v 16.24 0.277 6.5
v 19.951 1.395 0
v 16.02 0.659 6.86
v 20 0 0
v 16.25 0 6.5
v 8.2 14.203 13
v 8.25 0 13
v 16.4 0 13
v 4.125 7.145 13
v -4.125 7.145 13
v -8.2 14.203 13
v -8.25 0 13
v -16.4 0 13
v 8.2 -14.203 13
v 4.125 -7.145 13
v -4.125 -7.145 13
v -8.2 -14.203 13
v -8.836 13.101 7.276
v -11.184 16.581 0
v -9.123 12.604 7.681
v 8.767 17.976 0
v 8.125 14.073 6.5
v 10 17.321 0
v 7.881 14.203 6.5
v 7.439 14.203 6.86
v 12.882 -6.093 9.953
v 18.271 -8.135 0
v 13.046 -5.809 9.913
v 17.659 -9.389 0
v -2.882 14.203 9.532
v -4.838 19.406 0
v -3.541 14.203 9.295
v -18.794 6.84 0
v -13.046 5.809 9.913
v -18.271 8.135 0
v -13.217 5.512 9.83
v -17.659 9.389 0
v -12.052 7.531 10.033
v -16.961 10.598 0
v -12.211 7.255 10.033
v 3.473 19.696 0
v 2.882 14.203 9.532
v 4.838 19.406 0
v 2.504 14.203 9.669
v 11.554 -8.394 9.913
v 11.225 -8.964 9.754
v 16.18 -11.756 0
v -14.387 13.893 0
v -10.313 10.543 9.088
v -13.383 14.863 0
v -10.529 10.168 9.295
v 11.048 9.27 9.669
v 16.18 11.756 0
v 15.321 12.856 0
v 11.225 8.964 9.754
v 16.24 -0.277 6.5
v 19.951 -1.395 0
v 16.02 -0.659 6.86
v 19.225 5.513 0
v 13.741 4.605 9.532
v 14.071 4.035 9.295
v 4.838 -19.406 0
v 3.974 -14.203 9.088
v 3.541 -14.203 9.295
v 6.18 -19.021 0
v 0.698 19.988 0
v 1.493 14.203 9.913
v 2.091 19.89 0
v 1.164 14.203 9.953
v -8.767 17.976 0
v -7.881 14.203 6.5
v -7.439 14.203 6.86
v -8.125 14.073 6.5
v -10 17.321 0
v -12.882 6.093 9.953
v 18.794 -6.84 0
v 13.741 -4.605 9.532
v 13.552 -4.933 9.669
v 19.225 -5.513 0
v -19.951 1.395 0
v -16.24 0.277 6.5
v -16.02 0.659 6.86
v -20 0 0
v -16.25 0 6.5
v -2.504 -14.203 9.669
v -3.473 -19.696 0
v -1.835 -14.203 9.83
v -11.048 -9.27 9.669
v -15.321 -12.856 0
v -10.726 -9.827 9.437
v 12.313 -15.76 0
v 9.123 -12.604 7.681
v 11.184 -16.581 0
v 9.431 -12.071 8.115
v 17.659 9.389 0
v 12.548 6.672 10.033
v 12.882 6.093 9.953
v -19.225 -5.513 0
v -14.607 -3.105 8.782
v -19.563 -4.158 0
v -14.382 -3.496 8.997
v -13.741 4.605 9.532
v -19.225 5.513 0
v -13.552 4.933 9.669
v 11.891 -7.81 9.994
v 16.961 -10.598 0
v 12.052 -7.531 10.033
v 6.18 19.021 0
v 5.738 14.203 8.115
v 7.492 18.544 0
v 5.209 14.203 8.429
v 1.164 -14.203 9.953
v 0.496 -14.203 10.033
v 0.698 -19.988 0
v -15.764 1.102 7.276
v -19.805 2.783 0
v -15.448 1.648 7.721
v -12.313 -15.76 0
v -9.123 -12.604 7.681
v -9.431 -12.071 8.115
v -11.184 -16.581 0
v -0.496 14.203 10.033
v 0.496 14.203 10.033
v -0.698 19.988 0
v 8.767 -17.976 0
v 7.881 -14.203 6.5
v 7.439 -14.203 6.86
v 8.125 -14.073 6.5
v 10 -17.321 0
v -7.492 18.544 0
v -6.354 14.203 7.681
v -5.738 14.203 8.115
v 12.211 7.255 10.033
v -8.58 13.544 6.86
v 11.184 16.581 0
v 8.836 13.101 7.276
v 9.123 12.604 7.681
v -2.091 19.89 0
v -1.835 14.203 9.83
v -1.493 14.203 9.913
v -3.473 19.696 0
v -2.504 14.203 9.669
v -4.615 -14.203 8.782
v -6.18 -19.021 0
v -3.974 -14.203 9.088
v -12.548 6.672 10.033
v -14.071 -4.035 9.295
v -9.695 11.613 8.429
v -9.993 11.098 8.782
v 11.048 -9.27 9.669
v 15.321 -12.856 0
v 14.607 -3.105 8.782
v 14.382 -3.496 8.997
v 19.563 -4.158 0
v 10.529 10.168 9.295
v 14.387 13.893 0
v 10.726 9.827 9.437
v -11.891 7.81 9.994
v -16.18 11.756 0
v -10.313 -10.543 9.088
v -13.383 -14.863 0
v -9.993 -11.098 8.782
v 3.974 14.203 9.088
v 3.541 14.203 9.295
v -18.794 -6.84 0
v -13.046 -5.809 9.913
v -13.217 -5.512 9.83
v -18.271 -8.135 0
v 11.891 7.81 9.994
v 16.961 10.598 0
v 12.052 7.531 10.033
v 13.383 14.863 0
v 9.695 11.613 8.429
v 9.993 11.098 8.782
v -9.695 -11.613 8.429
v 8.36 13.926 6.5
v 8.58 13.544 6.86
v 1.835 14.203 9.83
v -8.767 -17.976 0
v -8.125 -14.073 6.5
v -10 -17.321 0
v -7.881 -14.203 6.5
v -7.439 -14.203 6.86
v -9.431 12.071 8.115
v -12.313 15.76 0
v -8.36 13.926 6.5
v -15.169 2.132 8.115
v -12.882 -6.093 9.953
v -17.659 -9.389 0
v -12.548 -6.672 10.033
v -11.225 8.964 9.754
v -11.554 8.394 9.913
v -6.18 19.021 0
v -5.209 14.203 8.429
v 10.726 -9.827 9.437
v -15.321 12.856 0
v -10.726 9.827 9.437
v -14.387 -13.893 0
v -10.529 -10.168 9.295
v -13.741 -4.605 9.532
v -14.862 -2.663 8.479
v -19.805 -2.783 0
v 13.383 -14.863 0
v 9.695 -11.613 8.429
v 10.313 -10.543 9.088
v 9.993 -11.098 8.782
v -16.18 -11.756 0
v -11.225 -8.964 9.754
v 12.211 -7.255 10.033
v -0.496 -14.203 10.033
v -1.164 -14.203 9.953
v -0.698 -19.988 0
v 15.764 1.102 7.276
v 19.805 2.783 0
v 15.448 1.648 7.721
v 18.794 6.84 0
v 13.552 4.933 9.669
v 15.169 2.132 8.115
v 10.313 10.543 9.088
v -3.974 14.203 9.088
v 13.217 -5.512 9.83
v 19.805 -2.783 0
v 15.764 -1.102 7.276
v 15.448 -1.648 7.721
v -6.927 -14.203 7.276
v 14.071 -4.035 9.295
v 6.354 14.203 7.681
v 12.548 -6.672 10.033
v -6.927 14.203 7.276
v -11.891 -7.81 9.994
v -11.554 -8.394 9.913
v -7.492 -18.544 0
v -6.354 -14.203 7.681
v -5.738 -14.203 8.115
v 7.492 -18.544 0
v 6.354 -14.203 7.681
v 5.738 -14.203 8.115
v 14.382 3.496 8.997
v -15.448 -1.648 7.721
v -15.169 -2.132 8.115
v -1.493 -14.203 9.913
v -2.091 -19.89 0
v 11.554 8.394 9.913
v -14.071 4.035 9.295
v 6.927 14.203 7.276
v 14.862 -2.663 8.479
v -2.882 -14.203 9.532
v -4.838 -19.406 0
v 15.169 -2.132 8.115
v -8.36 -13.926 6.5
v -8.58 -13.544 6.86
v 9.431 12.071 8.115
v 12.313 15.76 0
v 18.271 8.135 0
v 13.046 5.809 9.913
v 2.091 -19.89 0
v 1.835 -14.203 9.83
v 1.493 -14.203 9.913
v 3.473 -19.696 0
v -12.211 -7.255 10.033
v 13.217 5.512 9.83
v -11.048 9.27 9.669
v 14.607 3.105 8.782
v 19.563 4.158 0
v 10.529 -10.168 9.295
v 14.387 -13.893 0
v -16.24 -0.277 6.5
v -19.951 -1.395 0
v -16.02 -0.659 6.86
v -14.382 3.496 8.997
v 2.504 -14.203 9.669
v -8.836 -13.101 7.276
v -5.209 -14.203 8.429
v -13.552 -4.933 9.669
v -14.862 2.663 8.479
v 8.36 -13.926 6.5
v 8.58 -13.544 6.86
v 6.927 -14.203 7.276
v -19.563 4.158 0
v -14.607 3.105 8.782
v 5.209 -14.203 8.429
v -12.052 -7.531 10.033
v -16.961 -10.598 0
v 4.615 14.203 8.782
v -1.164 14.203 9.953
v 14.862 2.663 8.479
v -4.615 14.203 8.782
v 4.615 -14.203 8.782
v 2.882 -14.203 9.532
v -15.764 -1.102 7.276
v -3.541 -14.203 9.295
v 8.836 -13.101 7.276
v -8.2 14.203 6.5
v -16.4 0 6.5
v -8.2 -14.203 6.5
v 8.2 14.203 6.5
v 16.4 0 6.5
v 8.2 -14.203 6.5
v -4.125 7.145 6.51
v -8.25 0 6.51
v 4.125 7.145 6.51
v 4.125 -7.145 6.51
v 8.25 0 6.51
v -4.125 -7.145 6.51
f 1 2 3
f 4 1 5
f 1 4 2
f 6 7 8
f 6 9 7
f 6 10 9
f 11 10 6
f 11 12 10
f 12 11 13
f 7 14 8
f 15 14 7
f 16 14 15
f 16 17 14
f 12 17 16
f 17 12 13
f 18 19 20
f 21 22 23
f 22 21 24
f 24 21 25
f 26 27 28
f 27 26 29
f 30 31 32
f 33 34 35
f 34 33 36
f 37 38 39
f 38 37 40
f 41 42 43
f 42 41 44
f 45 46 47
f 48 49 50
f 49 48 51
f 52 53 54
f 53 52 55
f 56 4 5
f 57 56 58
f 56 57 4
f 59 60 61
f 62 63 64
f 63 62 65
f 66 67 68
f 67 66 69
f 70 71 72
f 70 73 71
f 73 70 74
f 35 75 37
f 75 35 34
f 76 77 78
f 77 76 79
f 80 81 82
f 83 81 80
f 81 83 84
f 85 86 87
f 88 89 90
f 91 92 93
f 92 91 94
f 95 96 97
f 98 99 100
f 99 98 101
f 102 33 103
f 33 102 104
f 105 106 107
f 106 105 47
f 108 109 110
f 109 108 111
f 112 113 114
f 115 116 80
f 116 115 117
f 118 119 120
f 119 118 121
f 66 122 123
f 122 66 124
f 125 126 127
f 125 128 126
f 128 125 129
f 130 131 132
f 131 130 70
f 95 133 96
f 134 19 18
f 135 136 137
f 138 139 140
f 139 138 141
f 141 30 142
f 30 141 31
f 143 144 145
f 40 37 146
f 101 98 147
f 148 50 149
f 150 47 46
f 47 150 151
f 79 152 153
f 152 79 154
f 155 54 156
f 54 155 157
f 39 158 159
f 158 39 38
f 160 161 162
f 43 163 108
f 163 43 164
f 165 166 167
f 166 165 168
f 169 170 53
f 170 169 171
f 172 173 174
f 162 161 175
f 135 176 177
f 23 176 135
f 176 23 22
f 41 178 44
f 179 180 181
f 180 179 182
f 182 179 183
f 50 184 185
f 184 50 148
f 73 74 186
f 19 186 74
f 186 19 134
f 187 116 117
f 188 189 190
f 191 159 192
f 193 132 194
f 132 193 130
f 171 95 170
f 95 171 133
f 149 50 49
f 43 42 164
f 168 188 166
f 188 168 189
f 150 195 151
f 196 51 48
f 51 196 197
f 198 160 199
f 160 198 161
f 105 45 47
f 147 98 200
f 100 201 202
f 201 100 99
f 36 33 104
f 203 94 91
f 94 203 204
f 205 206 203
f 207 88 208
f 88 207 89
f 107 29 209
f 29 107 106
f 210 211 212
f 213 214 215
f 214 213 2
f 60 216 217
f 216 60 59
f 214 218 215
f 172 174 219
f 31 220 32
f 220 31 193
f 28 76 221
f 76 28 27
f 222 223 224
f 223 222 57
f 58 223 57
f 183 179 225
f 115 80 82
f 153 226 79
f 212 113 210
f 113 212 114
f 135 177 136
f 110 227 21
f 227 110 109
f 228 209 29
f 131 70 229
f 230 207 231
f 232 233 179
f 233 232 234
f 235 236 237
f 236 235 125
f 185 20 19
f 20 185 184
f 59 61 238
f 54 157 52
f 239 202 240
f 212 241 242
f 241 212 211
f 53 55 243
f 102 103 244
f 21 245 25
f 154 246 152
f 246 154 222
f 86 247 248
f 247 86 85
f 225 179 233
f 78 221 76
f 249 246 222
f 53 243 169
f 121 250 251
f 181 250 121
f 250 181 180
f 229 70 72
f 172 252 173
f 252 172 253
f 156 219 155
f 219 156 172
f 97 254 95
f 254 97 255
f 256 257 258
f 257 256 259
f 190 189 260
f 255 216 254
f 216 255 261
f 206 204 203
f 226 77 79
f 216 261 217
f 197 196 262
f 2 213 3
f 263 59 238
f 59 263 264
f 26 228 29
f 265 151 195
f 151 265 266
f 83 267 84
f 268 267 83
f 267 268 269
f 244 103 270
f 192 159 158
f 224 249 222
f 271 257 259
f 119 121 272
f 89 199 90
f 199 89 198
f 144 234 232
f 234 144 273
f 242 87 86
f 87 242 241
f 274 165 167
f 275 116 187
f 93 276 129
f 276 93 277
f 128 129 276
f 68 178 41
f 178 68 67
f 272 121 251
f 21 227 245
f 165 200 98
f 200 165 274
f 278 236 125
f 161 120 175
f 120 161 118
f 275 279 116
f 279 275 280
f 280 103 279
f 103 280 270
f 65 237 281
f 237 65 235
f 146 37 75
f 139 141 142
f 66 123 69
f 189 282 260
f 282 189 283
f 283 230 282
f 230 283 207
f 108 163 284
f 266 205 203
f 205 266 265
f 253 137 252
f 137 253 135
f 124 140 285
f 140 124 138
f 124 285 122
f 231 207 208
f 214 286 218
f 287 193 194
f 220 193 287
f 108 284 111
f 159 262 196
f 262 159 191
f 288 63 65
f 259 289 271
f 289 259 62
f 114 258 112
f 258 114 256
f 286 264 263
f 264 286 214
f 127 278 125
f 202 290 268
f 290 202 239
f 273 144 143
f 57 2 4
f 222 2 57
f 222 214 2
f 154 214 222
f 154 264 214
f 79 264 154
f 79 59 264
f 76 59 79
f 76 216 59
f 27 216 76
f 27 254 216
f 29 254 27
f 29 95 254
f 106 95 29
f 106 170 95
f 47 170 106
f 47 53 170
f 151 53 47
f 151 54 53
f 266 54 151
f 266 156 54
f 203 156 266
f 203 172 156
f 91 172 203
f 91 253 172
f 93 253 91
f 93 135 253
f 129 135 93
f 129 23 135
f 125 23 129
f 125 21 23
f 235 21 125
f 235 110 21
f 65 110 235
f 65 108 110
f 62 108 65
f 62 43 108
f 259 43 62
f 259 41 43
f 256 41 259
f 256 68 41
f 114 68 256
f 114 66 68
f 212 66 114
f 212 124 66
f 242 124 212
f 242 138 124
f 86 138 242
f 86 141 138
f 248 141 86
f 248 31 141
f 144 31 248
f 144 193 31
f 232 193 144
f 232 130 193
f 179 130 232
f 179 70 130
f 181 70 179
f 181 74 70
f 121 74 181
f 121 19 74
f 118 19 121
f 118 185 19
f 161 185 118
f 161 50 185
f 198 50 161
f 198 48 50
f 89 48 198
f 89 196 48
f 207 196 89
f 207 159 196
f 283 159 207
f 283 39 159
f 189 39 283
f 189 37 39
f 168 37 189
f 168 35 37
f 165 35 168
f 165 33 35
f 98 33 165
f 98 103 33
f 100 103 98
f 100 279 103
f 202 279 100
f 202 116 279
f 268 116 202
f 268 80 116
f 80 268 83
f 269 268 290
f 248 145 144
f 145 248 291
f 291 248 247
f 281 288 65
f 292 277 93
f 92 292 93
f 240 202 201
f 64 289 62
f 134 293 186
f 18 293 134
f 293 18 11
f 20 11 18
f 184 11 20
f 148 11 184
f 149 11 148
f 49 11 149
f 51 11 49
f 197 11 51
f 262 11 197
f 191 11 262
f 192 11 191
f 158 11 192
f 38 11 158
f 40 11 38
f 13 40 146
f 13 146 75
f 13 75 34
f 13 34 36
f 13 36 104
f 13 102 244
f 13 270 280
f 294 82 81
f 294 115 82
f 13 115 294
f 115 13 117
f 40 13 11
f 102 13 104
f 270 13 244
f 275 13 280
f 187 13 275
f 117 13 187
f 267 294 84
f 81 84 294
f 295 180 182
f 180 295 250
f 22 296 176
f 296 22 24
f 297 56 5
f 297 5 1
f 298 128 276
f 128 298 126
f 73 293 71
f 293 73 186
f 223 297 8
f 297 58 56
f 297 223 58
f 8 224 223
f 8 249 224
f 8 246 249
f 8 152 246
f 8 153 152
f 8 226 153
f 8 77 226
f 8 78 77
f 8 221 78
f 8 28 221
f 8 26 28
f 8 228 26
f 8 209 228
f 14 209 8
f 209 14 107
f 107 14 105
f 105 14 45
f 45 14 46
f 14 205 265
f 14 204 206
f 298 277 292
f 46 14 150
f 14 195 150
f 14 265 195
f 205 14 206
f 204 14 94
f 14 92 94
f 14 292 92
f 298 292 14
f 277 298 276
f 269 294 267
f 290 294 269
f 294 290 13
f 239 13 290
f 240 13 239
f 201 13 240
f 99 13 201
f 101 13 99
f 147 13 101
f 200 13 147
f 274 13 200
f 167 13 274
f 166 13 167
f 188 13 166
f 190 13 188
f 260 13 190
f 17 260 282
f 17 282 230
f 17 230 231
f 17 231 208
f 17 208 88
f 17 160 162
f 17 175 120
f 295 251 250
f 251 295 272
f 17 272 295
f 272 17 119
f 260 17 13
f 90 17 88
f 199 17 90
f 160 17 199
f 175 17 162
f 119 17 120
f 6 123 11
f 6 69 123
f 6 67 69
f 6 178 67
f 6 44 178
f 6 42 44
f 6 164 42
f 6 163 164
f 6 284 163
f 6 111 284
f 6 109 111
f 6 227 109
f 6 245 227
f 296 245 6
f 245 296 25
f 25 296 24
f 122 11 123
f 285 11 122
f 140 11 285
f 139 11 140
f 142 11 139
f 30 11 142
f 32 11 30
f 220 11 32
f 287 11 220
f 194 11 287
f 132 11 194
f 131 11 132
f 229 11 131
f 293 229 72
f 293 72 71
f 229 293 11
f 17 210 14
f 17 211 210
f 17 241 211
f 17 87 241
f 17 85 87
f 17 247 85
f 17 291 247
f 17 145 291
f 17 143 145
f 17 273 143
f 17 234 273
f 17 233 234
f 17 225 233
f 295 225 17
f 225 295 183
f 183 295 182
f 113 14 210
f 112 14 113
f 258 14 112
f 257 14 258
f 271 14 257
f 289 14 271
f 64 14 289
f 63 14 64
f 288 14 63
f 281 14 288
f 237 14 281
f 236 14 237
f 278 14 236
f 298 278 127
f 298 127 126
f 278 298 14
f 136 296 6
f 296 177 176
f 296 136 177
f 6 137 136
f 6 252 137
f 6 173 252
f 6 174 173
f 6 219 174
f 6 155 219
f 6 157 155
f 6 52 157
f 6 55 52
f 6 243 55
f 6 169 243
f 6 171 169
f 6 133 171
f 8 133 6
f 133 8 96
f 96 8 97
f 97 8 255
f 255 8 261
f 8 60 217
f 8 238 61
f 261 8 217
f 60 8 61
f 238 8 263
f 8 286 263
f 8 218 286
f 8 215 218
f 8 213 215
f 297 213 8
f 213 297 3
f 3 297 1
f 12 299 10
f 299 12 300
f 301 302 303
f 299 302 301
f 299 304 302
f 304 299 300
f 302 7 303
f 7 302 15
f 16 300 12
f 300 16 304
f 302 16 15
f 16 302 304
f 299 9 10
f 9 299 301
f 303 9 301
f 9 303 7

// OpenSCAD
// file: ../modules/hexagon.scad
module hexagon(r = 1) {
  polygon([
    [-1 * r, 0],
    [-.5 * r, r * sqrt(3) / 2],
    [.5 * r, r * sqrt(3) / 2],
    [1 * r, 0],
    [.5 * r, r * sqrt(3) / -2],
    [-.5 * r, r * sqrt(3) / -2],
  ]);
}
// main file
include <../modules/hexagon.scad>

$fa=4; // default minimum facet angle is now 0.5
$fs=0.05; // default minimum facet size is now 0.05 mm

tolerance = .05;

hexMinor = 14.3;
hexMajor = 16.4;
hexDepth = 6.5;

footWidth = 20;

difference() {
  union() {
    cylinder(r1 = footWidth, r2 = footWidth * (5/8), h = hexDepth * 2);
    translate([0, 0, hexDepth]) linear_extrude(hexDepth) hexagon(hexMajor);
  }
  translate([0, 0, hexDepth + 0.01]) linear_extrude(hexDepth) hexagon(r = hexMajor / 2 + tolerance);
}
